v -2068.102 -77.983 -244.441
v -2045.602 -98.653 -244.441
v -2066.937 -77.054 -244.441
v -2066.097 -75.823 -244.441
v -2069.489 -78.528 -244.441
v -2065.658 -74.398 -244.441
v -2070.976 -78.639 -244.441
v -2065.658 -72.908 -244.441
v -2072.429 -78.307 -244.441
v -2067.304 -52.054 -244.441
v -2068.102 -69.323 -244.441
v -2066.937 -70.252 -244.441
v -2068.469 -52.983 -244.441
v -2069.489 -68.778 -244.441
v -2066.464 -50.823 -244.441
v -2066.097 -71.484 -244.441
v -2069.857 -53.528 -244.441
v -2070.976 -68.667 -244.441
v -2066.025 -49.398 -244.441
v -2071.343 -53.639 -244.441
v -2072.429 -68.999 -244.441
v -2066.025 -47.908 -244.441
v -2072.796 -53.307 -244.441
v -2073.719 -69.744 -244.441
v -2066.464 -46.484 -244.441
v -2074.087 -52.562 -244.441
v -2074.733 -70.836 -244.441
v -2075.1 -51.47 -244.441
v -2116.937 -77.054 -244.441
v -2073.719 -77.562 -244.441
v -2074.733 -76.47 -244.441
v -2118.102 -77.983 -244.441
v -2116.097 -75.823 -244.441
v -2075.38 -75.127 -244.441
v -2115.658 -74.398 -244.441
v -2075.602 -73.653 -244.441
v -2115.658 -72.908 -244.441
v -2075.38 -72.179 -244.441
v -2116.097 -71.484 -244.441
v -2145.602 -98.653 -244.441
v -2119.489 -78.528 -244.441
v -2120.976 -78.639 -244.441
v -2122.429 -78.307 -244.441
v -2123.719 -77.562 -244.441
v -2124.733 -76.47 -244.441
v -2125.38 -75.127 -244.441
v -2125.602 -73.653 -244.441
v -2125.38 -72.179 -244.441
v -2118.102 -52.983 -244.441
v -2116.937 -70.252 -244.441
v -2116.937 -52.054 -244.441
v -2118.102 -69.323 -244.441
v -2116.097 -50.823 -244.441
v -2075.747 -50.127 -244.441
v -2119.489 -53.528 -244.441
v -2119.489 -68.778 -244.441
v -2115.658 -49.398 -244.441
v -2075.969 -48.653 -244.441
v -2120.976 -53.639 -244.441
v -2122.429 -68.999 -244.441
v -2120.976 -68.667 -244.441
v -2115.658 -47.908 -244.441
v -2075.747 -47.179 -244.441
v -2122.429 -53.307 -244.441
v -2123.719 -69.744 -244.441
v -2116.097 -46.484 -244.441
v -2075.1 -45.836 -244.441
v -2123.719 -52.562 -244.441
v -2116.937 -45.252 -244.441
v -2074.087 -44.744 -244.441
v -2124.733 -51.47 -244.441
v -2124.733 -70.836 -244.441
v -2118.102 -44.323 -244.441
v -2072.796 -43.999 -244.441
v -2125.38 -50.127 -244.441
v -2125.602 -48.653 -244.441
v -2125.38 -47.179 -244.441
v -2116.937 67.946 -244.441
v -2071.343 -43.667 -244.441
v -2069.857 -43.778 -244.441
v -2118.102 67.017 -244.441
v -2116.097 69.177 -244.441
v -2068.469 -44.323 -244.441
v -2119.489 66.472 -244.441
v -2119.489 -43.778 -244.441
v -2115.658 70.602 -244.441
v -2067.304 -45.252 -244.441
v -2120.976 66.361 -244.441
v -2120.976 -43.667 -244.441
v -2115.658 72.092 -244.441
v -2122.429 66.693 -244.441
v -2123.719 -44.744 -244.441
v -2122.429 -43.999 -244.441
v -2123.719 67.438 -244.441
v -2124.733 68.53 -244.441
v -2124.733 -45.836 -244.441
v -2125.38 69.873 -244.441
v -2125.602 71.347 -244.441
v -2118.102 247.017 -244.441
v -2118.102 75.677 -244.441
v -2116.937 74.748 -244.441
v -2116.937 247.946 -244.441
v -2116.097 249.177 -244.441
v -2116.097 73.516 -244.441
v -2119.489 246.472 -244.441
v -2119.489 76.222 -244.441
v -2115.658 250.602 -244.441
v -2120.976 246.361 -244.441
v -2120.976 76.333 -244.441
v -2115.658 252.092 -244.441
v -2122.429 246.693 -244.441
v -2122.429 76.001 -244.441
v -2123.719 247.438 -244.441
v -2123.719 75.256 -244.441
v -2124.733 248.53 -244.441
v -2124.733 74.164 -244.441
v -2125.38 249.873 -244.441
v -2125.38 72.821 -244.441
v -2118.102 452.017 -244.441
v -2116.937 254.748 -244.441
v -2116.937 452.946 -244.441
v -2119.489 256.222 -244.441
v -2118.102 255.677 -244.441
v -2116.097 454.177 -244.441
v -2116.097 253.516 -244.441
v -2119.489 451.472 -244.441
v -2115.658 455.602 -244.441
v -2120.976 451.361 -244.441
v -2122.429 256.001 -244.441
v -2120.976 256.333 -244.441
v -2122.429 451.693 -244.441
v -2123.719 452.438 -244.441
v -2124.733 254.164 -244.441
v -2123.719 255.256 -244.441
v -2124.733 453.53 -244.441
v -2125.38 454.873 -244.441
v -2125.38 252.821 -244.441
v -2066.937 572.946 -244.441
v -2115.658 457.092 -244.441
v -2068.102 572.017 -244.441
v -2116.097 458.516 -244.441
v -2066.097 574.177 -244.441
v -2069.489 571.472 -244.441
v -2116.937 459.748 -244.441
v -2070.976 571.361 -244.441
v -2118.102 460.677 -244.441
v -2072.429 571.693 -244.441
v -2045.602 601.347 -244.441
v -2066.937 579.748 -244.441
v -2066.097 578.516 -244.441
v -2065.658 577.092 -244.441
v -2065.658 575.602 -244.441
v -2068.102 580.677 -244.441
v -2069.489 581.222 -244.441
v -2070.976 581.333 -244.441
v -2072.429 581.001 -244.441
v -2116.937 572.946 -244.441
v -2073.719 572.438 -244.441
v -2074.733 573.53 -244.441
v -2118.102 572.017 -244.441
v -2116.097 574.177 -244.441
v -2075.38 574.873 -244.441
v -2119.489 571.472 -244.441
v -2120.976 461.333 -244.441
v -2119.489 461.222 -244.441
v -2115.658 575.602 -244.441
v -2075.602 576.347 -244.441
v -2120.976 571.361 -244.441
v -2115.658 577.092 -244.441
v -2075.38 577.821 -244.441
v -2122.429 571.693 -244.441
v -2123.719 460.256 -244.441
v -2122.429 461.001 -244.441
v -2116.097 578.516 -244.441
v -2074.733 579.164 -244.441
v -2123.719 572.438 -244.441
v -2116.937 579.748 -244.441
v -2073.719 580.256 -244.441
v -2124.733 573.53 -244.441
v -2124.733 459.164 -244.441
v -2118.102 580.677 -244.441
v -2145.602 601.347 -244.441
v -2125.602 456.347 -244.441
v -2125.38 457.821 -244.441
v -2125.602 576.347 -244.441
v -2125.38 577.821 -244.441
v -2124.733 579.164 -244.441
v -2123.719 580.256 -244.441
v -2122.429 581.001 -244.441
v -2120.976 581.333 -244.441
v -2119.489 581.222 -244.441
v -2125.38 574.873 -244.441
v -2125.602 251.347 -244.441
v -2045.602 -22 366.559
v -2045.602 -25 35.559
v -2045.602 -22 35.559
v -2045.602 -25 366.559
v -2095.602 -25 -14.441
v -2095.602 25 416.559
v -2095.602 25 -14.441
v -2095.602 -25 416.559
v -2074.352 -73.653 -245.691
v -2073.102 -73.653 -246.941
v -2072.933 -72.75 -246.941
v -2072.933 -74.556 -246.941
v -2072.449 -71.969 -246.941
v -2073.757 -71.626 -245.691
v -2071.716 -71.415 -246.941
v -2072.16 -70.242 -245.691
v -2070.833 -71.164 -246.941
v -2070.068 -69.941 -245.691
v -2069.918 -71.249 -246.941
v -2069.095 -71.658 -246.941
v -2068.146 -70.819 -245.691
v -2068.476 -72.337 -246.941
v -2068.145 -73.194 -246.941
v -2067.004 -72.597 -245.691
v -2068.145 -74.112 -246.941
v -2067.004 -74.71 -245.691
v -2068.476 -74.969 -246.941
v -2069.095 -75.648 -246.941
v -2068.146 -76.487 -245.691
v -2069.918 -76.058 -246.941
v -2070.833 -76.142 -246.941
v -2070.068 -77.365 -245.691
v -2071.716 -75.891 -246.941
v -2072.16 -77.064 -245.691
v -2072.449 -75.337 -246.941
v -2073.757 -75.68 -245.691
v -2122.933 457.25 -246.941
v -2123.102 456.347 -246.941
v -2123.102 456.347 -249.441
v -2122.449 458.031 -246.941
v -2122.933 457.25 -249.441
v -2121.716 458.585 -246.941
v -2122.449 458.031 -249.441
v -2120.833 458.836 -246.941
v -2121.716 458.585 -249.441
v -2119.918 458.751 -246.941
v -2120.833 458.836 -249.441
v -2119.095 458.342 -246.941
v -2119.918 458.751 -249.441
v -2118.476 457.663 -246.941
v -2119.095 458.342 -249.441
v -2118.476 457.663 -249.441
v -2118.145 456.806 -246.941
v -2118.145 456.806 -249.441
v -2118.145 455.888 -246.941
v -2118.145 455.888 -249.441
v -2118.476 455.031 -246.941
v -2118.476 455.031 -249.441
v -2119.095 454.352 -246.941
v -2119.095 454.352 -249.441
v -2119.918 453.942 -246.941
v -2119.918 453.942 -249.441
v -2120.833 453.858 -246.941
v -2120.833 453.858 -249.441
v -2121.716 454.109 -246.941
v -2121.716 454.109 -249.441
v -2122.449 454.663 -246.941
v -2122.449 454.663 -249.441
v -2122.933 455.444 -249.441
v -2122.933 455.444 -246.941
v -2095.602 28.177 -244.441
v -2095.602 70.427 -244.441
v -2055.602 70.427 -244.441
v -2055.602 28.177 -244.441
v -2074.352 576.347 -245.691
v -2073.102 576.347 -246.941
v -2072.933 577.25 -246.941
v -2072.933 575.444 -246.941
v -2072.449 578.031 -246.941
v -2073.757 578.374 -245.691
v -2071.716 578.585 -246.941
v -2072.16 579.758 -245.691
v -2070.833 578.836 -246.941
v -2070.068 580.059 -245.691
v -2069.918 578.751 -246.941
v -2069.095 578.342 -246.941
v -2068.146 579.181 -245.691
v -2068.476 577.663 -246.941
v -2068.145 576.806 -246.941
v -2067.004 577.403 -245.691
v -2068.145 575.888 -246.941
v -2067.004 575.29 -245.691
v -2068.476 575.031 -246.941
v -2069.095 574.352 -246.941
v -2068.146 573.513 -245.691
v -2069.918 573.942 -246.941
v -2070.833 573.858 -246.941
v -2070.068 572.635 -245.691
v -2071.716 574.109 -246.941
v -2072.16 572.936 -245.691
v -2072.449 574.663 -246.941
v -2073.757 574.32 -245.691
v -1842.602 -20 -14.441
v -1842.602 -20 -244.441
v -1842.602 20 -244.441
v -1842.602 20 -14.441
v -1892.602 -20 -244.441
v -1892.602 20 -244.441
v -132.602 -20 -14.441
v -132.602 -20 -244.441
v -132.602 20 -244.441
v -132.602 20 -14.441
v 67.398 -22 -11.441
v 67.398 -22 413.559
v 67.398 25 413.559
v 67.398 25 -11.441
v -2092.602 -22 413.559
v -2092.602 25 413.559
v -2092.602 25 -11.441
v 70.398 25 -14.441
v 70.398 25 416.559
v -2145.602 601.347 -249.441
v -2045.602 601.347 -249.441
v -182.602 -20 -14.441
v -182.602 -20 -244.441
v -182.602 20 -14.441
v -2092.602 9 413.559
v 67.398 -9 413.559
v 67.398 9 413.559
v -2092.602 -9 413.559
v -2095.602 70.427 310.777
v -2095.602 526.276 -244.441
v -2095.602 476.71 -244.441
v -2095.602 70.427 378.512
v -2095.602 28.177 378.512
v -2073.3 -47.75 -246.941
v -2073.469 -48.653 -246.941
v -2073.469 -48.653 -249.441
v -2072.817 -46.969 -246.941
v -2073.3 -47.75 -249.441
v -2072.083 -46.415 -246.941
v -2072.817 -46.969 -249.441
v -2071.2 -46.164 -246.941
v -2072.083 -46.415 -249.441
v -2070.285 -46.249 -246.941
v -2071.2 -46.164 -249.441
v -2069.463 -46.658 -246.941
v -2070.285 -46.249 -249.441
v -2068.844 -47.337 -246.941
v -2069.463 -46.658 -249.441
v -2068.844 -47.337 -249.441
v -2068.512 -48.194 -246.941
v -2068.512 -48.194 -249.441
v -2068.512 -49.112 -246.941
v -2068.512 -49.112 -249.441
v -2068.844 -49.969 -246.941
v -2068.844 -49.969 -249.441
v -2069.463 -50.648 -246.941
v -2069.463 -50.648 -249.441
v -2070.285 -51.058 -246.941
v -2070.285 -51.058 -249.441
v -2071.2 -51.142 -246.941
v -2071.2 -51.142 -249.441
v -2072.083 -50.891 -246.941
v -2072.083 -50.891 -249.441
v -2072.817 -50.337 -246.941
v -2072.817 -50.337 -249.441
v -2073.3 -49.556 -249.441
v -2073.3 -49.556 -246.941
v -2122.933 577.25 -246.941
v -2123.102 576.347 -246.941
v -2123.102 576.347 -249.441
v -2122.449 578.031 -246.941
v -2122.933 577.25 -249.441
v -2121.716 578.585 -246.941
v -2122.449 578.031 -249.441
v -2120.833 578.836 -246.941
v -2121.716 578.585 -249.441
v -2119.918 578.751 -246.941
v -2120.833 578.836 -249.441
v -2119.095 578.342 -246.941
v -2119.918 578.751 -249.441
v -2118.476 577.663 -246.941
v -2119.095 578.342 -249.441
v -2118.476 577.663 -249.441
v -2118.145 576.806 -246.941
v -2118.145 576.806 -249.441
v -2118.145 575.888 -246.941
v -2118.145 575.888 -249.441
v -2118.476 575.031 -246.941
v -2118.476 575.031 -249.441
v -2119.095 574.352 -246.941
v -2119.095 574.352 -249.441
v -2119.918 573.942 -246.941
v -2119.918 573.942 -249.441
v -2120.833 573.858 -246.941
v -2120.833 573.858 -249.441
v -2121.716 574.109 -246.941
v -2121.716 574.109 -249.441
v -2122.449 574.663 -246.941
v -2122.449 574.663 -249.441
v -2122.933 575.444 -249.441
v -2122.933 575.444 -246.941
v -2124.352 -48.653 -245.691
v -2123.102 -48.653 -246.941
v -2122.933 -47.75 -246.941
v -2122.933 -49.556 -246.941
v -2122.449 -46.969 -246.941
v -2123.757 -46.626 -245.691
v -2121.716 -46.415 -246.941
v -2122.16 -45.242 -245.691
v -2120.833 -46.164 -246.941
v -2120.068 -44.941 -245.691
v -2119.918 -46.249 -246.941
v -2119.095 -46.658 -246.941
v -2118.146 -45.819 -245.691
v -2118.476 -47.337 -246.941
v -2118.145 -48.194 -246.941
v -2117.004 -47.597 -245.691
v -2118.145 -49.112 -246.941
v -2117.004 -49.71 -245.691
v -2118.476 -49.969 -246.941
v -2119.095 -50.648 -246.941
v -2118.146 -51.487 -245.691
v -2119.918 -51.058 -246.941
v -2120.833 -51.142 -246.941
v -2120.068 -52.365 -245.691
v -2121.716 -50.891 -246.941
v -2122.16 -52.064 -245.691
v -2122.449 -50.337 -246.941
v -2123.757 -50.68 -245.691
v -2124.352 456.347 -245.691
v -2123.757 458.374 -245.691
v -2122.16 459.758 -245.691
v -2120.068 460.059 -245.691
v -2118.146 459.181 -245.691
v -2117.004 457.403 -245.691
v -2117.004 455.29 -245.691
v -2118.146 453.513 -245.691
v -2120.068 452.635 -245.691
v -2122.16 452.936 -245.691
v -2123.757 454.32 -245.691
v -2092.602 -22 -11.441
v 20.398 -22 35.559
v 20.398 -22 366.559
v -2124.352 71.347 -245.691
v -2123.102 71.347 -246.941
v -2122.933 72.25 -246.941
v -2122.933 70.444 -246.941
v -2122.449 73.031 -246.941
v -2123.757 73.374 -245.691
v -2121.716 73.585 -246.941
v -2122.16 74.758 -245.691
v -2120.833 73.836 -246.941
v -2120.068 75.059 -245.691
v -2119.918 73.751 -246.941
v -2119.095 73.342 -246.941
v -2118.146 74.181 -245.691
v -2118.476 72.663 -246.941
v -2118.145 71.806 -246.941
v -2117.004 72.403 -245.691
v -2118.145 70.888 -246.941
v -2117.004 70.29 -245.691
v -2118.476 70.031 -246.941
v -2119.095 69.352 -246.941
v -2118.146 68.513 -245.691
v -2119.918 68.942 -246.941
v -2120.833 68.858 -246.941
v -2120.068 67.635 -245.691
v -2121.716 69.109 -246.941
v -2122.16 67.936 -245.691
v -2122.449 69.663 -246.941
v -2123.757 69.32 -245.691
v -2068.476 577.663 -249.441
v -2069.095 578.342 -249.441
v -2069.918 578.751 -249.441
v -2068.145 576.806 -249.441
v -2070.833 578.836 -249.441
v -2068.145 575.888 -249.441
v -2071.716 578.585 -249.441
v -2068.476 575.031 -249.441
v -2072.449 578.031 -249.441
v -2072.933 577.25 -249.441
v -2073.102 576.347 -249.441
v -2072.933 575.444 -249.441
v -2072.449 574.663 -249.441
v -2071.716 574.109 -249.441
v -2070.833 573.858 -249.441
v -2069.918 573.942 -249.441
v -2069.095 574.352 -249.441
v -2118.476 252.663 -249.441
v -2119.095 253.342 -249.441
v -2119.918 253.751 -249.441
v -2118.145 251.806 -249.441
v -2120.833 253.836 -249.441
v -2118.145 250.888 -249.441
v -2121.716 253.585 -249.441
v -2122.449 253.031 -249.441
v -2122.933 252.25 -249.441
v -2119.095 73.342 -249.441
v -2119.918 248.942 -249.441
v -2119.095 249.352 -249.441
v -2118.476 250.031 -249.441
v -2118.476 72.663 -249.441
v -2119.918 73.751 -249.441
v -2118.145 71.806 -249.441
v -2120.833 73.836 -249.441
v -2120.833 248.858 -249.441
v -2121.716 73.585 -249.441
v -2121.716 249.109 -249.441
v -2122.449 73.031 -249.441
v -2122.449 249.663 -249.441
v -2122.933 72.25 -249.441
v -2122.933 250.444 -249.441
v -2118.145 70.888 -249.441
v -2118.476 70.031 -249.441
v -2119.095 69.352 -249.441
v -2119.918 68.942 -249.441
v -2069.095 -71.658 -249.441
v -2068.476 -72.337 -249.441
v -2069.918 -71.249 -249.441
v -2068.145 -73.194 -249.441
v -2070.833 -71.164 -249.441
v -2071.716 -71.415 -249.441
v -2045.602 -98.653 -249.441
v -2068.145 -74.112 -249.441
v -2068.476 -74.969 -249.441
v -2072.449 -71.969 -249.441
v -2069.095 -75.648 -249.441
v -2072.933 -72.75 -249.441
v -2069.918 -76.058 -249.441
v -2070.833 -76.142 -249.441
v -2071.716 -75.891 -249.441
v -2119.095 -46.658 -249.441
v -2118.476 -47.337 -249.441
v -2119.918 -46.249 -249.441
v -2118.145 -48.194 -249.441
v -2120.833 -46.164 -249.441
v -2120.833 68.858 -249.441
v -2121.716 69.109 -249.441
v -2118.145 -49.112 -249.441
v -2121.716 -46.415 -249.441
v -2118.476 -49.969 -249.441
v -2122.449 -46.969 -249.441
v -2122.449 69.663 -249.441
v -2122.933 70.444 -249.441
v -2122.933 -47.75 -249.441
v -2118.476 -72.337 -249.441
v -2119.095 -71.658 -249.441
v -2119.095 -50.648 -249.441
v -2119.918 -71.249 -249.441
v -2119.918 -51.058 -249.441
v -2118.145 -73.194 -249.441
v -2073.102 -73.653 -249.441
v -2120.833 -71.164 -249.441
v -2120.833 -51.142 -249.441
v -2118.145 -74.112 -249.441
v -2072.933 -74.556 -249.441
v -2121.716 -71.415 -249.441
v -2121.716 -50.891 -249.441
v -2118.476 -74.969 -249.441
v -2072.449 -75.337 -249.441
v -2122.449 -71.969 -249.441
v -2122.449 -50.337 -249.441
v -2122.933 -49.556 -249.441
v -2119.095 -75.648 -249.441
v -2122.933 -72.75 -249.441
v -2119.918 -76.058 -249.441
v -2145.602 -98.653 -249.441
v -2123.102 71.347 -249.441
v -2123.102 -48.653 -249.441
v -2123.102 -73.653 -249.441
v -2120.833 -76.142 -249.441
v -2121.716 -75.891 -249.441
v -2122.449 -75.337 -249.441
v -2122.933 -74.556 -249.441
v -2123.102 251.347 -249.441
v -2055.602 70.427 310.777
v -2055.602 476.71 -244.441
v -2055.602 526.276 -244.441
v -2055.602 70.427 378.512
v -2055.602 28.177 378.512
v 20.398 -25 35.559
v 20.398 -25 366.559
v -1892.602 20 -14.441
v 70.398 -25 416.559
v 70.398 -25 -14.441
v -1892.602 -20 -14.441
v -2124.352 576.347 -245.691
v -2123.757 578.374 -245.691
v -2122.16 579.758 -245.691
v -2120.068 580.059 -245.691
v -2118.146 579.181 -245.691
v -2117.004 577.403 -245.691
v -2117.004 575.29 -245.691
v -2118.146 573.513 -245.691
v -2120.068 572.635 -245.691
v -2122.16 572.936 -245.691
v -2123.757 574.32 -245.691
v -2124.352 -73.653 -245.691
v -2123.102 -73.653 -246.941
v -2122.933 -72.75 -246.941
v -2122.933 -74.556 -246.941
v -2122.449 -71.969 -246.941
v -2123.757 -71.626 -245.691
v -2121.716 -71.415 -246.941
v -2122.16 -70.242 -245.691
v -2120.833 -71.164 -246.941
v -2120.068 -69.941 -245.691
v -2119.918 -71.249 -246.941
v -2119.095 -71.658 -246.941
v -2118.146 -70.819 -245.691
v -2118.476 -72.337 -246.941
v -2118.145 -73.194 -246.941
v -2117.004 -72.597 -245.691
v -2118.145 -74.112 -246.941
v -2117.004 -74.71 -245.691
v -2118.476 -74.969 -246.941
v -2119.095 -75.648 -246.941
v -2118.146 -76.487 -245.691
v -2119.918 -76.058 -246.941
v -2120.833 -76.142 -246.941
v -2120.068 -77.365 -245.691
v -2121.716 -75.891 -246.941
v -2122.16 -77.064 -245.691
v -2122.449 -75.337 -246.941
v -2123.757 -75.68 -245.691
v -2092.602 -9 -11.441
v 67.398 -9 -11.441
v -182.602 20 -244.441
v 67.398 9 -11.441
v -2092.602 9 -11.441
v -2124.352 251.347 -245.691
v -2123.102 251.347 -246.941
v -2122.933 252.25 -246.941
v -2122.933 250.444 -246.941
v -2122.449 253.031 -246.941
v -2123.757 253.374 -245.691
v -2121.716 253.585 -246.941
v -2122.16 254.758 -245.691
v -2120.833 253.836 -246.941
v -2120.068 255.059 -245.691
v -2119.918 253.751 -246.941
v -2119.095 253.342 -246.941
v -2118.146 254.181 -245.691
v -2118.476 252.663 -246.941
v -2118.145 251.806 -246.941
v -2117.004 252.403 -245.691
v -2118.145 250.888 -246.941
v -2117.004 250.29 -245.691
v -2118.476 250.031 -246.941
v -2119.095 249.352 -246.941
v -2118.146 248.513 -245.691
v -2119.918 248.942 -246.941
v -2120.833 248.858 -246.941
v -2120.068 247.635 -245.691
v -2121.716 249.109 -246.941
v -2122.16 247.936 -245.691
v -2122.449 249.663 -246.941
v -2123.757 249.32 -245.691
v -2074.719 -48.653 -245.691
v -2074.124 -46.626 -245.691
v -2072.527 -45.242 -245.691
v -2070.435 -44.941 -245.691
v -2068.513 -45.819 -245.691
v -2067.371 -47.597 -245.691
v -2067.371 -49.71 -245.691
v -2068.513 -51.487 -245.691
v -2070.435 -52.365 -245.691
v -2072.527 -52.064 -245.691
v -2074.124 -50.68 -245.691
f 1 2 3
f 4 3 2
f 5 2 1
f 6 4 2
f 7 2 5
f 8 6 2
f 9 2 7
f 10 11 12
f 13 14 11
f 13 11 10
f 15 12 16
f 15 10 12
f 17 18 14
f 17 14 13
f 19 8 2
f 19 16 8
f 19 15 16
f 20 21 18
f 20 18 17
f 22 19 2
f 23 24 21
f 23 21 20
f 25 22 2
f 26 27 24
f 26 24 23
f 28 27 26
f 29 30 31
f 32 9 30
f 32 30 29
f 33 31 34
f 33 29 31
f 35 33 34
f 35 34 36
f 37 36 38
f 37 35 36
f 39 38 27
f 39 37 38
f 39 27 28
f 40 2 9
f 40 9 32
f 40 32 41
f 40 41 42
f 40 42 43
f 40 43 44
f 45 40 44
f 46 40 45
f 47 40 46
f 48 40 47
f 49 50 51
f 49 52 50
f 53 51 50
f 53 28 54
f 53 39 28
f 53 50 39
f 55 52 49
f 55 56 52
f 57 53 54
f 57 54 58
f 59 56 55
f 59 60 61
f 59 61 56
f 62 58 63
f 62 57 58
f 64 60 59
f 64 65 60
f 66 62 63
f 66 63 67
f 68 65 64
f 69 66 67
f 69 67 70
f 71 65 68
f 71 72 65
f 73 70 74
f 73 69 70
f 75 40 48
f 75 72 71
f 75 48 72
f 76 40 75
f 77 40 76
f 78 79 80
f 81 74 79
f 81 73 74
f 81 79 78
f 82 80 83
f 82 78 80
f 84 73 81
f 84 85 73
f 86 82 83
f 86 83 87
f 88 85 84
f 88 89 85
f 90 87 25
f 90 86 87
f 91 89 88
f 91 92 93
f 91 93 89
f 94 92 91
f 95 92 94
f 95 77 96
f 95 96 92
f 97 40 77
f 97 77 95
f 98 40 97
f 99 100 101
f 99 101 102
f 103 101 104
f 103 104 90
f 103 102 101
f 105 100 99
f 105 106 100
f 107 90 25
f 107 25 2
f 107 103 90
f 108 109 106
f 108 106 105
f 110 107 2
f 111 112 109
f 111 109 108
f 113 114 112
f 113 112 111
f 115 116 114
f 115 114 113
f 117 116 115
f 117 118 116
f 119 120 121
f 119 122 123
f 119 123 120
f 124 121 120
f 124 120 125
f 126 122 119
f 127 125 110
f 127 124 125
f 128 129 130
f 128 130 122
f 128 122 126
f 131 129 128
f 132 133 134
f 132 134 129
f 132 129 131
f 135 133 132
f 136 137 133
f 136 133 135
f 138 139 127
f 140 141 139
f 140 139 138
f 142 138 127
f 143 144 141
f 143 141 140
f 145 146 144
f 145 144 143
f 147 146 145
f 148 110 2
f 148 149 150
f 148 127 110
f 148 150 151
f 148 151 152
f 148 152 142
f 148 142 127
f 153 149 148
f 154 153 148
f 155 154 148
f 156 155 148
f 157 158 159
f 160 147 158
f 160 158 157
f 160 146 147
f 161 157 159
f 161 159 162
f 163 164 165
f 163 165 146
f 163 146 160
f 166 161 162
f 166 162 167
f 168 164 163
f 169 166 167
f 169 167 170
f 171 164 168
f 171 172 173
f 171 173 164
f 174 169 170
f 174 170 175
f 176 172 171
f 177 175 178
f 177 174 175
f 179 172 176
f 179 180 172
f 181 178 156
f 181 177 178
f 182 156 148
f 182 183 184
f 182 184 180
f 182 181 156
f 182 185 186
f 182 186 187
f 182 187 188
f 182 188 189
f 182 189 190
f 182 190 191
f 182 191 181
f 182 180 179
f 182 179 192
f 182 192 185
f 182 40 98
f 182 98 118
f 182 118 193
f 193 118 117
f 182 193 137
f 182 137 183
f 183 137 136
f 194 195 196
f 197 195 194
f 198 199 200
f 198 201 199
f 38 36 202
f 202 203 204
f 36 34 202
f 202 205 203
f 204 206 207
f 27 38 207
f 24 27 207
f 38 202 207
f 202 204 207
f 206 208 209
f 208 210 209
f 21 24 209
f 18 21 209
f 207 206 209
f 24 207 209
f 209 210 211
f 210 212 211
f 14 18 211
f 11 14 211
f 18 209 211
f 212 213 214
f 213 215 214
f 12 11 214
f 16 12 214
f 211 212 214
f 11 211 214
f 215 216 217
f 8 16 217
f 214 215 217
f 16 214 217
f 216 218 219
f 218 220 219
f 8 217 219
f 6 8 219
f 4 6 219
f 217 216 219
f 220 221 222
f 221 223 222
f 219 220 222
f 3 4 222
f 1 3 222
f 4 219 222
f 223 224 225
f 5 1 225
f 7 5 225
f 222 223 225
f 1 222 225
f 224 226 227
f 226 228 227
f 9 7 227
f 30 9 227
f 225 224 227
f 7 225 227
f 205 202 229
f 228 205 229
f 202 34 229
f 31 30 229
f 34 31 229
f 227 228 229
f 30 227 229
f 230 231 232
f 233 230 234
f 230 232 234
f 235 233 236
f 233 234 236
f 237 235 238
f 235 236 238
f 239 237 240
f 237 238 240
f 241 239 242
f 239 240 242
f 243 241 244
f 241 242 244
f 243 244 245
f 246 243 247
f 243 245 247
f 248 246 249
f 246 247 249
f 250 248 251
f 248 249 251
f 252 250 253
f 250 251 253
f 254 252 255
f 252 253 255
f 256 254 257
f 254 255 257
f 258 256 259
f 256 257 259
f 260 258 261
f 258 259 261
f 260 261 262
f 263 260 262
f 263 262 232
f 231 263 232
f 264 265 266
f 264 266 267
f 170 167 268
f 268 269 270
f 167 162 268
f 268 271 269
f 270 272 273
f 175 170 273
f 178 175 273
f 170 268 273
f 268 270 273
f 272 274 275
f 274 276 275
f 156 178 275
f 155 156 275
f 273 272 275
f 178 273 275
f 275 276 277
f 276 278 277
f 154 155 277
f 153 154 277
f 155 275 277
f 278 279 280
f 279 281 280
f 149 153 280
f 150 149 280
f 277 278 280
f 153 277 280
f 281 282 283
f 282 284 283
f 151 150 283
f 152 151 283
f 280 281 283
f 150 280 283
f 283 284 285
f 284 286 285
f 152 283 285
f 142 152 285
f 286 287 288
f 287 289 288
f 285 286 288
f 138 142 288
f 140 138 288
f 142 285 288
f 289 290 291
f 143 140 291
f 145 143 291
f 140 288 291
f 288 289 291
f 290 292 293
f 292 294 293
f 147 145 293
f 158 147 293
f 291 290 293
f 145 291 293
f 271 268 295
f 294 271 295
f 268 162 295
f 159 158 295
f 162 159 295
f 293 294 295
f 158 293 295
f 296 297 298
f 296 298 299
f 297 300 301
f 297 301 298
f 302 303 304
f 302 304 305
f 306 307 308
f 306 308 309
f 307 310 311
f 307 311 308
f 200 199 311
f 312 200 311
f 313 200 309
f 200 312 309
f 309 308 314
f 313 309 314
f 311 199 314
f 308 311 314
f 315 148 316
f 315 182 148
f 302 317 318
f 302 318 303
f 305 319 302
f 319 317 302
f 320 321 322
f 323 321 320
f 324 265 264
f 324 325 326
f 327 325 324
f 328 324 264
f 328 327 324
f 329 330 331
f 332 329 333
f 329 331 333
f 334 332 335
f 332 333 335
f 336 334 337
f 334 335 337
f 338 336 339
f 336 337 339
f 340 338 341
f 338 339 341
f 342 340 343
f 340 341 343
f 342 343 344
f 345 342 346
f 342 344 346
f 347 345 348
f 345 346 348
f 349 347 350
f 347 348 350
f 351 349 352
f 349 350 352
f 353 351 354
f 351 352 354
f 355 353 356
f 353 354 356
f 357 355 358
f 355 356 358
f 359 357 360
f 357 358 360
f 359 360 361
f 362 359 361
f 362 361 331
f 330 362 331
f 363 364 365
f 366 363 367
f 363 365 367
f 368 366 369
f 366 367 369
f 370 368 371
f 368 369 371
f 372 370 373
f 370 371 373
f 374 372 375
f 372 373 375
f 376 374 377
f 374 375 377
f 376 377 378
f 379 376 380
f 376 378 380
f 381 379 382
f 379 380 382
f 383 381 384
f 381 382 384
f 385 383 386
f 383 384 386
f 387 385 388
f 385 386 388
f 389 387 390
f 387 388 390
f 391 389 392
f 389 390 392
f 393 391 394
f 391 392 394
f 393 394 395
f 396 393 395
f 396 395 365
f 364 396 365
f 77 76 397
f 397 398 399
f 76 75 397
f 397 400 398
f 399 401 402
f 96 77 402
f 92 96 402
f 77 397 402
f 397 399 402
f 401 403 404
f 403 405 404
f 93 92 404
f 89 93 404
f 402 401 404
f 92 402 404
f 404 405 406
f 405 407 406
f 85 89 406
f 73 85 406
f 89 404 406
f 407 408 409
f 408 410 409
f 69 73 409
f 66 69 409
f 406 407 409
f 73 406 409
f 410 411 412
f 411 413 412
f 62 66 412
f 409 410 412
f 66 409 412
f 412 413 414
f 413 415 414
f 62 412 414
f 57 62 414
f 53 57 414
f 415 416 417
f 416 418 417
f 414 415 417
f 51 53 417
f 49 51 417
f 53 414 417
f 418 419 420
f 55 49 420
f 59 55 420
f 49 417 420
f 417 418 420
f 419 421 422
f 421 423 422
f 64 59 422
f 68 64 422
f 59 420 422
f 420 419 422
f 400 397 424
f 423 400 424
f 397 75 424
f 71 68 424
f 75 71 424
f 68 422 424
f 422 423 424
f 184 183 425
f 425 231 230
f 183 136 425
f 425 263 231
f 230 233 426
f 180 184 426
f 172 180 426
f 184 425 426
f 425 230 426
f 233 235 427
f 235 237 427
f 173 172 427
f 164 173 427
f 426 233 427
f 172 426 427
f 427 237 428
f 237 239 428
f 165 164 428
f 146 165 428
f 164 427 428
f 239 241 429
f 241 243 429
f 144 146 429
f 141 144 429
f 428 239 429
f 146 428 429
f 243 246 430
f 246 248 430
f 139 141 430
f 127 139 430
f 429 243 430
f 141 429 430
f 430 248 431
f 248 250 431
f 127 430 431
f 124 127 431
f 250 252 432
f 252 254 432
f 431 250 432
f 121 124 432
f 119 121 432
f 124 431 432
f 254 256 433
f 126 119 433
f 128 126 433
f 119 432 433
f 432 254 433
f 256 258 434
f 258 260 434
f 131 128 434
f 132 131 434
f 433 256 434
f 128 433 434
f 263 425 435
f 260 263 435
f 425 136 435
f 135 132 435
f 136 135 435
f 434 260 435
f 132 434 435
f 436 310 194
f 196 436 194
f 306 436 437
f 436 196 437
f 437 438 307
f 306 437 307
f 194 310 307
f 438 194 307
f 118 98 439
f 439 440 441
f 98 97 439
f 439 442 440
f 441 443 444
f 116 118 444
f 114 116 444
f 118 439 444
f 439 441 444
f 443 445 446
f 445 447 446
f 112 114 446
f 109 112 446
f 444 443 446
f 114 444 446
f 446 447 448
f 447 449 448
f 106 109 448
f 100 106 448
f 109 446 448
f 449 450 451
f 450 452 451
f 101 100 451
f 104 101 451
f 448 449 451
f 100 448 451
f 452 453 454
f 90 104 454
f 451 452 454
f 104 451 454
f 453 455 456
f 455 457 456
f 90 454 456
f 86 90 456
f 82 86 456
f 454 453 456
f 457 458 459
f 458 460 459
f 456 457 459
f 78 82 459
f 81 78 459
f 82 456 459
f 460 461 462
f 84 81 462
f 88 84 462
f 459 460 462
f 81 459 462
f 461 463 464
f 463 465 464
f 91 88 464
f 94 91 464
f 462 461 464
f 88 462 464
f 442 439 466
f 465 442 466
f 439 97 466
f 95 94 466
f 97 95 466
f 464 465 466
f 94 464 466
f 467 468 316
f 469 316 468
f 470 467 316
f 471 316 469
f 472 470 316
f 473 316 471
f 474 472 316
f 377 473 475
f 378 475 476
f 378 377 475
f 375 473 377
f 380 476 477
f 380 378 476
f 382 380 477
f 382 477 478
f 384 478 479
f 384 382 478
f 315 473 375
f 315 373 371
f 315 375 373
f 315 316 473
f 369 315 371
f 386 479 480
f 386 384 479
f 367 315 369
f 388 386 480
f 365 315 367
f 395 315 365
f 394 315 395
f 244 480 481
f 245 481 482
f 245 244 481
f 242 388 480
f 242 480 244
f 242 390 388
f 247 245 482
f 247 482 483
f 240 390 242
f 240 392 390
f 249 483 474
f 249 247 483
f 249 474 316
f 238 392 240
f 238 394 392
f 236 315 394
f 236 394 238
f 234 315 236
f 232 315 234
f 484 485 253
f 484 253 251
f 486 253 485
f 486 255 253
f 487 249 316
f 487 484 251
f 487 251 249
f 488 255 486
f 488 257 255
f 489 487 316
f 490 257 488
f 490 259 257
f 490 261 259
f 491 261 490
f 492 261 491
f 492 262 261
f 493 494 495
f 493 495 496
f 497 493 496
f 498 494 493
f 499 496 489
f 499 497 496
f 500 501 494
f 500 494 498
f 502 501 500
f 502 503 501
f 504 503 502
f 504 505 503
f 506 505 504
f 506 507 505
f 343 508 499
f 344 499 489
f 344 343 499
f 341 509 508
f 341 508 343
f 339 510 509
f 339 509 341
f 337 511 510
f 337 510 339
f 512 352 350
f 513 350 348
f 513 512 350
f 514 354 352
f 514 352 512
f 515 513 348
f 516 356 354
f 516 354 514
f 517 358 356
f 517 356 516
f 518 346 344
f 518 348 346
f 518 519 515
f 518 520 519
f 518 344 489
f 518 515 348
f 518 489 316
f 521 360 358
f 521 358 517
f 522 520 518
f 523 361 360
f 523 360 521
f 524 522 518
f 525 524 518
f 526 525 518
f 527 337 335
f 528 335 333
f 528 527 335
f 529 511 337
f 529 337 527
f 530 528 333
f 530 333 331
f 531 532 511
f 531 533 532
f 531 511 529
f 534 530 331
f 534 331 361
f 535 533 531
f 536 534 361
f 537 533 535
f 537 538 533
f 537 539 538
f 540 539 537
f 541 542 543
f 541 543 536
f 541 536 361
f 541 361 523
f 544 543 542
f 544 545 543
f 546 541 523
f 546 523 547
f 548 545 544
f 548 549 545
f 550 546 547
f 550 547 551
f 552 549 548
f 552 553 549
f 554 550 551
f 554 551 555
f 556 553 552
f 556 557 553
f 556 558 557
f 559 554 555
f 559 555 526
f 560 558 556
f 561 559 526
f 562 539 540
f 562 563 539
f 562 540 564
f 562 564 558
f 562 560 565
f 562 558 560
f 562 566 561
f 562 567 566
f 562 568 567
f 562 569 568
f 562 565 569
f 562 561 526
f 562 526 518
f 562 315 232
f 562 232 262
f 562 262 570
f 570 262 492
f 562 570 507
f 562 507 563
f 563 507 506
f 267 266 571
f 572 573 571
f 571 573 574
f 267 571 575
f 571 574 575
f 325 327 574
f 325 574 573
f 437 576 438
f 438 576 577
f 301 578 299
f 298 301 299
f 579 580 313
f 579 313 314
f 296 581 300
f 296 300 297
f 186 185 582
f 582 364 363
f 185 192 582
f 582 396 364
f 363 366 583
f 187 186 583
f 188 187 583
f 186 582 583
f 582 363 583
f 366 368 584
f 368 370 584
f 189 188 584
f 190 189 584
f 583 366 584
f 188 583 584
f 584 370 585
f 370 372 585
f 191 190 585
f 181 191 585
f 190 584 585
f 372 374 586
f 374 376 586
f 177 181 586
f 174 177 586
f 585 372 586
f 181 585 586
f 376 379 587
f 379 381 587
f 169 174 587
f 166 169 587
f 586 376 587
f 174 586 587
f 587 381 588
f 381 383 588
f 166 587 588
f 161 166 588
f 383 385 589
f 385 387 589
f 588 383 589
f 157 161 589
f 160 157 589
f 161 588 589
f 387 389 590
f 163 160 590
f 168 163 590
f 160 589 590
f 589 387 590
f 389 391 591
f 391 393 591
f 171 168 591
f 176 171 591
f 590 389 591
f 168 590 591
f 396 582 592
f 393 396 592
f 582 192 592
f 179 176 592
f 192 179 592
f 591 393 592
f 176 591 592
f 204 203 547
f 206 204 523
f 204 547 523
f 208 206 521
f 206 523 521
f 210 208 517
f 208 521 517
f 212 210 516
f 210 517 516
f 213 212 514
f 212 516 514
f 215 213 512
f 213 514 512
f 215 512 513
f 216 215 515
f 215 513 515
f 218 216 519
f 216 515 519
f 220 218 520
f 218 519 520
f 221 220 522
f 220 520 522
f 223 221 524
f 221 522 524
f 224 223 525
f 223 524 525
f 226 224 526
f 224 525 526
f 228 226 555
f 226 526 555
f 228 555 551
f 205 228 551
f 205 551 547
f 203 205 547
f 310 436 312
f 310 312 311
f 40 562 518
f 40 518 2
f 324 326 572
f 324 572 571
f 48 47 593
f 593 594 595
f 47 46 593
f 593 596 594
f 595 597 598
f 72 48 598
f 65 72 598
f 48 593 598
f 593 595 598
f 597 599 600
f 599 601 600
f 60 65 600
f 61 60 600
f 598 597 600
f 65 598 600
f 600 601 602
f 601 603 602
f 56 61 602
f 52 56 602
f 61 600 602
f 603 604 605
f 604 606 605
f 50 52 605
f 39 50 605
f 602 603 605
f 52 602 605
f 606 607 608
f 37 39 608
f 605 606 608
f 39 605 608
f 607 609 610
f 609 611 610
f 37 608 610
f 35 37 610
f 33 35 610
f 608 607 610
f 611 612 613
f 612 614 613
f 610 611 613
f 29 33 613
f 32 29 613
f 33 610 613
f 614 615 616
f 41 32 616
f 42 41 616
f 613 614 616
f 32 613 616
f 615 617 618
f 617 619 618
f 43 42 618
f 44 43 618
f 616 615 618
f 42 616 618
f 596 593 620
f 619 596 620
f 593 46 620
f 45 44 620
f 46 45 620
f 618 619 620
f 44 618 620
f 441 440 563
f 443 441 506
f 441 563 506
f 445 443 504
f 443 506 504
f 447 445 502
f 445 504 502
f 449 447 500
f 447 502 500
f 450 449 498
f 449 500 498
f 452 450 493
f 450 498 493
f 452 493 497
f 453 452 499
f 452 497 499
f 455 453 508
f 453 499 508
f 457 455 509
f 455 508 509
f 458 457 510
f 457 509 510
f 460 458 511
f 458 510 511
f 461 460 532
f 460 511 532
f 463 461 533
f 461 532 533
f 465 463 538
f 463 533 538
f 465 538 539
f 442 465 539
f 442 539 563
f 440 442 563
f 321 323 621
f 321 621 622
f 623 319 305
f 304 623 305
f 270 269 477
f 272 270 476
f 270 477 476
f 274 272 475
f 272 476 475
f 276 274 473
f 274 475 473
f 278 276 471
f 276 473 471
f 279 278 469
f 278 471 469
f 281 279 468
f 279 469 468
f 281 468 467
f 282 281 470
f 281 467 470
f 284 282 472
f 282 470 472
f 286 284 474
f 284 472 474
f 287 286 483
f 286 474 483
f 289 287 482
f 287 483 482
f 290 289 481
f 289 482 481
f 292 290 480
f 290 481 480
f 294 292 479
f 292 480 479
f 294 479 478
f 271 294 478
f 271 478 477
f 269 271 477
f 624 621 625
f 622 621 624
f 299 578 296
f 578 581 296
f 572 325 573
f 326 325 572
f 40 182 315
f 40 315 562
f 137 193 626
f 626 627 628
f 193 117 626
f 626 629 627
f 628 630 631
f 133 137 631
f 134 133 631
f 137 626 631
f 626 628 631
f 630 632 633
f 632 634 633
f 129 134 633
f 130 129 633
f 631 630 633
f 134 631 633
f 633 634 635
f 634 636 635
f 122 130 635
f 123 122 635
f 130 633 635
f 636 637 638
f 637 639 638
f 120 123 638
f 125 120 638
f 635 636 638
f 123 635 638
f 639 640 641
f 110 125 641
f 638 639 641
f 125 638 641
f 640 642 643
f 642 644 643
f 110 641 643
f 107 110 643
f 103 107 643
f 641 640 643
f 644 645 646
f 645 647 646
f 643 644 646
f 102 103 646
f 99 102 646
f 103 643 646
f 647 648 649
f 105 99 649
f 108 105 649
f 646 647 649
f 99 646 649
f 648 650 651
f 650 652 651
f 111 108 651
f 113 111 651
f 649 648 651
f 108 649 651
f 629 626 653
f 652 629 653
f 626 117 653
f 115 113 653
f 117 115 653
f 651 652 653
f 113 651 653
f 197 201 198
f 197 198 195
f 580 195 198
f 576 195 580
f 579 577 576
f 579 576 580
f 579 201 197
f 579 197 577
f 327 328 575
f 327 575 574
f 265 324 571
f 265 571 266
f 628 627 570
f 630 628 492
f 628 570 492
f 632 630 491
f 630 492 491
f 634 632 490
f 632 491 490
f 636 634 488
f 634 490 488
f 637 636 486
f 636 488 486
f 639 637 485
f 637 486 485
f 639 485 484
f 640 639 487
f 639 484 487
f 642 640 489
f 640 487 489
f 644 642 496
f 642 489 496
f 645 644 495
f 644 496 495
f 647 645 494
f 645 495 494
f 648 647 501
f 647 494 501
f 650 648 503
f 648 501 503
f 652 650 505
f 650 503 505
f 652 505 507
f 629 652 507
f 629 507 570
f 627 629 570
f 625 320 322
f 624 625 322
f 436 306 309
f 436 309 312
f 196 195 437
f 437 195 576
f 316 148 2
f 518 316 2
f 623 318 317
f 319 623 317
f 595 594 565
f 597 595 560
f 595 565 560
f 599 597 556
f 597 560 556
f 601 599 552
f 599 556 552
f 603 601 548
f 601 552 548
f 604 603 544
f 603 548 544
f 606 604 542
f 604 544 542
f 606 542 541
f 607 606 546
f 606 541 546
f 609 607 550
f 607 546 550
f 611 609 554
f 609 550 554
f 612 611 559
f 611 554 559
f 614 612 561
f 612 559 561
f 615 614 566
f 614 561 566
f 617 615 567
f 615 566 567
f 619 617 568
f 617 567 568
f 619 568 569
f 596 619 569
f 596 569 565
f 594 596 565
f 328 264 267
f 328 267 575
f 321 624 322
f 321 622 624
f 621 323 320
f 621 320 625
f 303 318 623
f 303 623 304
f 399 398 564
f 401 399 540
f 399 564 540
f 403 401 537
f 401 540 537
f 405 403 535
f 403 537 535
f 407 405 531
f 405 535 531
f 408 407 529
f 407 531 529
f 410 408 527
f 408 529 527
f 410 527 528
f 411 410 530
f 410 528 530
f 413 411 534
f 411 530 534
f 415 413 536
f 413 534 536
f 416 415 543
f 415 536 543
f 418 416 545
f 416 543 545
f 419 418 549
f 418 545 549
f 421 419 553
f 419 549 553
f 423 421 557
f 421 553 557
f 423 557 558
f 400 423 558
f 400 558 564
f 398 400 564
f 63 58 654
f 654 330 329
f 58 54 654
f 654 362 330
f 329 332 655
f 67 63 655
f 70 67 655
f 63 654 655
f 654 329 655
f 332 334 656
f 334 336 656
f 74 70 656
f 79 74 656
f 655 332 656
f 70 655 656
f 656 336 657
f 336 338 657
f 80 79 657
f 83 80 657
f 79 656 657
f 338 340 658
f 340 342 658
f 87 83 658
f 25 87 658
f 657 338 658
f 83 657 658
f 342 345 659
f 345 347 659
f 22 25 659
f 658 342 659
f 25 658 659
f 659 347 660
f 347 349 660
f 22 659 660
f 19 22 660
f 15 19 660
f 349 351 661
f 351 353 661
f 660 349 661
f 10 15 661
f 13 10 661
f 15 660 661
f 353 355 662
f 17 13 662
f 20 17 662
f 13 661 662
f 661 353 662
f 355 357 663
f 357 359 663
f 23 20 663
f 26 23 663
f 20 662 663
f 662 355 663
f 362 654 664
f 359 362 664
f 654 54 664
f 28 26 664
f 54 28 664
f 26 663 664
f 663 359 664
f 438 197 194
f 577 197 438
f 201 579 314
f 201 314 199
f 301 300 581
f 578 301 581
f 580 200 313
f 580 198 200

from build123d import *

# Parameters (mm, degrees)
F0_W            = 2060
F0_H            = 325
F1_DEPTH        = 9
F2_DEPTH        = 25
F0_W_2          = 50
F0_H_2          = 230
F3_DEPTH        = 20
F4_W            = 2160
F4_H            = 425
F4_W_2          = 2066
F4_H_2          = 331
F5_DEPTH        = 3
F7_DEPTH        = 40
F8_DEPTH        = 50
F10_D           = 5
F10_CSINK_D     = 10
F10_CSINK_ANGLE = 90


with BuildPart() as f1:
    # F0 (on Front) → F1 (new body, symmetric)
    with BuildSketch(Plane.XZ):
        Polygon((67.3980626017, 413.5589126498), (-2092.6019373983, 413.5589126498), (-2092.6019373983, -11.4410873502), (-1892.6019373983, -11.4410873502), (-1842.6019373983, -11.4410873502), (-182.6019373983, -11.4410873502), (-132.6019373983, -11.4410873502), (67.3980626017, -11.4410873502), align=None)
        with Locations((-1012.6019373983, 201.0589126498)):
            Rectangle(F0_W, F0_H, mode=Mode.SUBTRACT)
        with Locations((-1012.6019373983, 201.0589126498)):
            Rectangle(F0_W, F0_H)
    extrude(amount=F1_DEPTH, both=True)


with BuildPart() as f2:
    # F0 (on Front) → F2 (new body, symmetric)
    with BuildSketch(Plane.XZ):
        Polygon((-2095.6019373983, -14.4410873502), (-1892.6019373983, -14.4410873502), (-1842.6019373983, -14.4410873502), (-182.6019373983, -14.4410873502), (-132.6019373983, -14.4410873502), (70.3980626017, -14.4410873502), (70.3980626017, 416.5589126498), (-2095.6019373983, 416.5589126498), align=None)
        Polygon((-2092.6019373983, -11.4410873502), (-2092.6019373983, 413.5589126498), (67.3980626017, 413.5589126498), (67.3980626017, -11.4410873502), (-132.6019373983, -11.4410873502), (-182.6019373983, -11.4410873502), (-1842.6019373983, -11.4410873502), (-1892.6019373983, -11.4410873502), align=None, mode=Mode.SUBTRACT)
    extrude(amount=F2_DEPTH, both=True)

    # F4 (on face) → F5 (join)
    with BuildSketch(Plane.XZ.offset(25)):
        with Locations((-1012.6019373983, 201.0589126498)):
            Rectangle(F4_W, F4_H)
        with Locations((-1012.6019373983, 201.0589126498)):
            Rectangle(F4_W_2, F4_H_2, mode=Mode.SUBTRACT)
    extrude(amount=-F5_DEPTH)


with BuildPart() as f3:
    # F0 (on Front) → F3 (new body, symmetric)
    with BuildSketch(Plane.XZ):
        with Locations((-1867.6019373983, -129.4410873502)):
            Rectangle(F0_W_2, F0_H_2)
    extrude(amount=F3_DEPTH, both=True)


with BuildPart() as f3b:
    # F0 (on Front) → F3, piece 2 (new body, symmetric)
    with BuildSketch(Plane.XZ):
        with Locations((-157.6019373983, -129.4410873502)):
            Rectangle(F0_W_2, F0_H_2)
    extrude(amount=F3_DEPTH, both=True)


with BuildPart() as f7:
    # F6 (on face) → F7 (new body)
    with BuildSketch(Plane(origin=(-2095.6019373983, 0, 0), x_dir=(0, -1, 0), z_dir=(-1, 0, 0))):
        Polygon((-476.710391711, -244.4410873502), (-70.4267646607, 310.776676828), (-70.4267646607, 378.5118322609), (-526.2759611211, -244.4410873502), align=None)
        Polygon((-70.4267646607, 378.5118322609), (-70.4267646607, 310.776676828), (-70.4267646607, -244.4410873502), (-28.1774010509, -244.4410873502), (-28.1774010509, 378.5118322609), align=None)
    extrude(amount=-F7_DEPTH)


with BuildPart() as f8:
    # F6 (on face) → F8 (new body, symmetric)
    with BuildSketch(Plane(origin=(-2095.6019373983, 0, 0), x_dir=(0, -1, 0), z_dir=(-1, 0, 0))):
        Polygon((-70.4267646607, -244.4410873502), (-476.710391711, -244.4410873502), (-526.2759611211, -244.4410873502), (-601.3469099998, -244.4410873502), (-601.3469099998, -249.4410873502), (98.6530900002, -249.4410873502), (98.6530900002, -244.4410873502), (-28.1774010509, -244.4410873502), align=None)
    extrude(amount=F8_DEPTH, both=True)

    # F10 (through all)
    with Locations(Plane.XY.offset(-244.4410873502)):
        with Locations((-2070.6019373983, -73.6530900002), (-2120.6019373983, -73.6530900002), (-2120.6019373983, -48.6530900002), (-2070.9691047668, -48.6530900002), (-2120.6019373983, 71.3469099998), (-2120.6019373983, 251.3469099998), (-2120.6019373983, 456.3469099998), (-2070.6019373983, 576.3469099998), (-2120.6019373983, 576.3469099998)):
            CounterSinkHole(F10_D / 2, F10_CSINK_D / 2, counter_sink_angle=F10_CSINK_ANGLE)


solid = Compound([f1.part, f2.part, f3.part, f3b.part, f7.part, f8.part])
